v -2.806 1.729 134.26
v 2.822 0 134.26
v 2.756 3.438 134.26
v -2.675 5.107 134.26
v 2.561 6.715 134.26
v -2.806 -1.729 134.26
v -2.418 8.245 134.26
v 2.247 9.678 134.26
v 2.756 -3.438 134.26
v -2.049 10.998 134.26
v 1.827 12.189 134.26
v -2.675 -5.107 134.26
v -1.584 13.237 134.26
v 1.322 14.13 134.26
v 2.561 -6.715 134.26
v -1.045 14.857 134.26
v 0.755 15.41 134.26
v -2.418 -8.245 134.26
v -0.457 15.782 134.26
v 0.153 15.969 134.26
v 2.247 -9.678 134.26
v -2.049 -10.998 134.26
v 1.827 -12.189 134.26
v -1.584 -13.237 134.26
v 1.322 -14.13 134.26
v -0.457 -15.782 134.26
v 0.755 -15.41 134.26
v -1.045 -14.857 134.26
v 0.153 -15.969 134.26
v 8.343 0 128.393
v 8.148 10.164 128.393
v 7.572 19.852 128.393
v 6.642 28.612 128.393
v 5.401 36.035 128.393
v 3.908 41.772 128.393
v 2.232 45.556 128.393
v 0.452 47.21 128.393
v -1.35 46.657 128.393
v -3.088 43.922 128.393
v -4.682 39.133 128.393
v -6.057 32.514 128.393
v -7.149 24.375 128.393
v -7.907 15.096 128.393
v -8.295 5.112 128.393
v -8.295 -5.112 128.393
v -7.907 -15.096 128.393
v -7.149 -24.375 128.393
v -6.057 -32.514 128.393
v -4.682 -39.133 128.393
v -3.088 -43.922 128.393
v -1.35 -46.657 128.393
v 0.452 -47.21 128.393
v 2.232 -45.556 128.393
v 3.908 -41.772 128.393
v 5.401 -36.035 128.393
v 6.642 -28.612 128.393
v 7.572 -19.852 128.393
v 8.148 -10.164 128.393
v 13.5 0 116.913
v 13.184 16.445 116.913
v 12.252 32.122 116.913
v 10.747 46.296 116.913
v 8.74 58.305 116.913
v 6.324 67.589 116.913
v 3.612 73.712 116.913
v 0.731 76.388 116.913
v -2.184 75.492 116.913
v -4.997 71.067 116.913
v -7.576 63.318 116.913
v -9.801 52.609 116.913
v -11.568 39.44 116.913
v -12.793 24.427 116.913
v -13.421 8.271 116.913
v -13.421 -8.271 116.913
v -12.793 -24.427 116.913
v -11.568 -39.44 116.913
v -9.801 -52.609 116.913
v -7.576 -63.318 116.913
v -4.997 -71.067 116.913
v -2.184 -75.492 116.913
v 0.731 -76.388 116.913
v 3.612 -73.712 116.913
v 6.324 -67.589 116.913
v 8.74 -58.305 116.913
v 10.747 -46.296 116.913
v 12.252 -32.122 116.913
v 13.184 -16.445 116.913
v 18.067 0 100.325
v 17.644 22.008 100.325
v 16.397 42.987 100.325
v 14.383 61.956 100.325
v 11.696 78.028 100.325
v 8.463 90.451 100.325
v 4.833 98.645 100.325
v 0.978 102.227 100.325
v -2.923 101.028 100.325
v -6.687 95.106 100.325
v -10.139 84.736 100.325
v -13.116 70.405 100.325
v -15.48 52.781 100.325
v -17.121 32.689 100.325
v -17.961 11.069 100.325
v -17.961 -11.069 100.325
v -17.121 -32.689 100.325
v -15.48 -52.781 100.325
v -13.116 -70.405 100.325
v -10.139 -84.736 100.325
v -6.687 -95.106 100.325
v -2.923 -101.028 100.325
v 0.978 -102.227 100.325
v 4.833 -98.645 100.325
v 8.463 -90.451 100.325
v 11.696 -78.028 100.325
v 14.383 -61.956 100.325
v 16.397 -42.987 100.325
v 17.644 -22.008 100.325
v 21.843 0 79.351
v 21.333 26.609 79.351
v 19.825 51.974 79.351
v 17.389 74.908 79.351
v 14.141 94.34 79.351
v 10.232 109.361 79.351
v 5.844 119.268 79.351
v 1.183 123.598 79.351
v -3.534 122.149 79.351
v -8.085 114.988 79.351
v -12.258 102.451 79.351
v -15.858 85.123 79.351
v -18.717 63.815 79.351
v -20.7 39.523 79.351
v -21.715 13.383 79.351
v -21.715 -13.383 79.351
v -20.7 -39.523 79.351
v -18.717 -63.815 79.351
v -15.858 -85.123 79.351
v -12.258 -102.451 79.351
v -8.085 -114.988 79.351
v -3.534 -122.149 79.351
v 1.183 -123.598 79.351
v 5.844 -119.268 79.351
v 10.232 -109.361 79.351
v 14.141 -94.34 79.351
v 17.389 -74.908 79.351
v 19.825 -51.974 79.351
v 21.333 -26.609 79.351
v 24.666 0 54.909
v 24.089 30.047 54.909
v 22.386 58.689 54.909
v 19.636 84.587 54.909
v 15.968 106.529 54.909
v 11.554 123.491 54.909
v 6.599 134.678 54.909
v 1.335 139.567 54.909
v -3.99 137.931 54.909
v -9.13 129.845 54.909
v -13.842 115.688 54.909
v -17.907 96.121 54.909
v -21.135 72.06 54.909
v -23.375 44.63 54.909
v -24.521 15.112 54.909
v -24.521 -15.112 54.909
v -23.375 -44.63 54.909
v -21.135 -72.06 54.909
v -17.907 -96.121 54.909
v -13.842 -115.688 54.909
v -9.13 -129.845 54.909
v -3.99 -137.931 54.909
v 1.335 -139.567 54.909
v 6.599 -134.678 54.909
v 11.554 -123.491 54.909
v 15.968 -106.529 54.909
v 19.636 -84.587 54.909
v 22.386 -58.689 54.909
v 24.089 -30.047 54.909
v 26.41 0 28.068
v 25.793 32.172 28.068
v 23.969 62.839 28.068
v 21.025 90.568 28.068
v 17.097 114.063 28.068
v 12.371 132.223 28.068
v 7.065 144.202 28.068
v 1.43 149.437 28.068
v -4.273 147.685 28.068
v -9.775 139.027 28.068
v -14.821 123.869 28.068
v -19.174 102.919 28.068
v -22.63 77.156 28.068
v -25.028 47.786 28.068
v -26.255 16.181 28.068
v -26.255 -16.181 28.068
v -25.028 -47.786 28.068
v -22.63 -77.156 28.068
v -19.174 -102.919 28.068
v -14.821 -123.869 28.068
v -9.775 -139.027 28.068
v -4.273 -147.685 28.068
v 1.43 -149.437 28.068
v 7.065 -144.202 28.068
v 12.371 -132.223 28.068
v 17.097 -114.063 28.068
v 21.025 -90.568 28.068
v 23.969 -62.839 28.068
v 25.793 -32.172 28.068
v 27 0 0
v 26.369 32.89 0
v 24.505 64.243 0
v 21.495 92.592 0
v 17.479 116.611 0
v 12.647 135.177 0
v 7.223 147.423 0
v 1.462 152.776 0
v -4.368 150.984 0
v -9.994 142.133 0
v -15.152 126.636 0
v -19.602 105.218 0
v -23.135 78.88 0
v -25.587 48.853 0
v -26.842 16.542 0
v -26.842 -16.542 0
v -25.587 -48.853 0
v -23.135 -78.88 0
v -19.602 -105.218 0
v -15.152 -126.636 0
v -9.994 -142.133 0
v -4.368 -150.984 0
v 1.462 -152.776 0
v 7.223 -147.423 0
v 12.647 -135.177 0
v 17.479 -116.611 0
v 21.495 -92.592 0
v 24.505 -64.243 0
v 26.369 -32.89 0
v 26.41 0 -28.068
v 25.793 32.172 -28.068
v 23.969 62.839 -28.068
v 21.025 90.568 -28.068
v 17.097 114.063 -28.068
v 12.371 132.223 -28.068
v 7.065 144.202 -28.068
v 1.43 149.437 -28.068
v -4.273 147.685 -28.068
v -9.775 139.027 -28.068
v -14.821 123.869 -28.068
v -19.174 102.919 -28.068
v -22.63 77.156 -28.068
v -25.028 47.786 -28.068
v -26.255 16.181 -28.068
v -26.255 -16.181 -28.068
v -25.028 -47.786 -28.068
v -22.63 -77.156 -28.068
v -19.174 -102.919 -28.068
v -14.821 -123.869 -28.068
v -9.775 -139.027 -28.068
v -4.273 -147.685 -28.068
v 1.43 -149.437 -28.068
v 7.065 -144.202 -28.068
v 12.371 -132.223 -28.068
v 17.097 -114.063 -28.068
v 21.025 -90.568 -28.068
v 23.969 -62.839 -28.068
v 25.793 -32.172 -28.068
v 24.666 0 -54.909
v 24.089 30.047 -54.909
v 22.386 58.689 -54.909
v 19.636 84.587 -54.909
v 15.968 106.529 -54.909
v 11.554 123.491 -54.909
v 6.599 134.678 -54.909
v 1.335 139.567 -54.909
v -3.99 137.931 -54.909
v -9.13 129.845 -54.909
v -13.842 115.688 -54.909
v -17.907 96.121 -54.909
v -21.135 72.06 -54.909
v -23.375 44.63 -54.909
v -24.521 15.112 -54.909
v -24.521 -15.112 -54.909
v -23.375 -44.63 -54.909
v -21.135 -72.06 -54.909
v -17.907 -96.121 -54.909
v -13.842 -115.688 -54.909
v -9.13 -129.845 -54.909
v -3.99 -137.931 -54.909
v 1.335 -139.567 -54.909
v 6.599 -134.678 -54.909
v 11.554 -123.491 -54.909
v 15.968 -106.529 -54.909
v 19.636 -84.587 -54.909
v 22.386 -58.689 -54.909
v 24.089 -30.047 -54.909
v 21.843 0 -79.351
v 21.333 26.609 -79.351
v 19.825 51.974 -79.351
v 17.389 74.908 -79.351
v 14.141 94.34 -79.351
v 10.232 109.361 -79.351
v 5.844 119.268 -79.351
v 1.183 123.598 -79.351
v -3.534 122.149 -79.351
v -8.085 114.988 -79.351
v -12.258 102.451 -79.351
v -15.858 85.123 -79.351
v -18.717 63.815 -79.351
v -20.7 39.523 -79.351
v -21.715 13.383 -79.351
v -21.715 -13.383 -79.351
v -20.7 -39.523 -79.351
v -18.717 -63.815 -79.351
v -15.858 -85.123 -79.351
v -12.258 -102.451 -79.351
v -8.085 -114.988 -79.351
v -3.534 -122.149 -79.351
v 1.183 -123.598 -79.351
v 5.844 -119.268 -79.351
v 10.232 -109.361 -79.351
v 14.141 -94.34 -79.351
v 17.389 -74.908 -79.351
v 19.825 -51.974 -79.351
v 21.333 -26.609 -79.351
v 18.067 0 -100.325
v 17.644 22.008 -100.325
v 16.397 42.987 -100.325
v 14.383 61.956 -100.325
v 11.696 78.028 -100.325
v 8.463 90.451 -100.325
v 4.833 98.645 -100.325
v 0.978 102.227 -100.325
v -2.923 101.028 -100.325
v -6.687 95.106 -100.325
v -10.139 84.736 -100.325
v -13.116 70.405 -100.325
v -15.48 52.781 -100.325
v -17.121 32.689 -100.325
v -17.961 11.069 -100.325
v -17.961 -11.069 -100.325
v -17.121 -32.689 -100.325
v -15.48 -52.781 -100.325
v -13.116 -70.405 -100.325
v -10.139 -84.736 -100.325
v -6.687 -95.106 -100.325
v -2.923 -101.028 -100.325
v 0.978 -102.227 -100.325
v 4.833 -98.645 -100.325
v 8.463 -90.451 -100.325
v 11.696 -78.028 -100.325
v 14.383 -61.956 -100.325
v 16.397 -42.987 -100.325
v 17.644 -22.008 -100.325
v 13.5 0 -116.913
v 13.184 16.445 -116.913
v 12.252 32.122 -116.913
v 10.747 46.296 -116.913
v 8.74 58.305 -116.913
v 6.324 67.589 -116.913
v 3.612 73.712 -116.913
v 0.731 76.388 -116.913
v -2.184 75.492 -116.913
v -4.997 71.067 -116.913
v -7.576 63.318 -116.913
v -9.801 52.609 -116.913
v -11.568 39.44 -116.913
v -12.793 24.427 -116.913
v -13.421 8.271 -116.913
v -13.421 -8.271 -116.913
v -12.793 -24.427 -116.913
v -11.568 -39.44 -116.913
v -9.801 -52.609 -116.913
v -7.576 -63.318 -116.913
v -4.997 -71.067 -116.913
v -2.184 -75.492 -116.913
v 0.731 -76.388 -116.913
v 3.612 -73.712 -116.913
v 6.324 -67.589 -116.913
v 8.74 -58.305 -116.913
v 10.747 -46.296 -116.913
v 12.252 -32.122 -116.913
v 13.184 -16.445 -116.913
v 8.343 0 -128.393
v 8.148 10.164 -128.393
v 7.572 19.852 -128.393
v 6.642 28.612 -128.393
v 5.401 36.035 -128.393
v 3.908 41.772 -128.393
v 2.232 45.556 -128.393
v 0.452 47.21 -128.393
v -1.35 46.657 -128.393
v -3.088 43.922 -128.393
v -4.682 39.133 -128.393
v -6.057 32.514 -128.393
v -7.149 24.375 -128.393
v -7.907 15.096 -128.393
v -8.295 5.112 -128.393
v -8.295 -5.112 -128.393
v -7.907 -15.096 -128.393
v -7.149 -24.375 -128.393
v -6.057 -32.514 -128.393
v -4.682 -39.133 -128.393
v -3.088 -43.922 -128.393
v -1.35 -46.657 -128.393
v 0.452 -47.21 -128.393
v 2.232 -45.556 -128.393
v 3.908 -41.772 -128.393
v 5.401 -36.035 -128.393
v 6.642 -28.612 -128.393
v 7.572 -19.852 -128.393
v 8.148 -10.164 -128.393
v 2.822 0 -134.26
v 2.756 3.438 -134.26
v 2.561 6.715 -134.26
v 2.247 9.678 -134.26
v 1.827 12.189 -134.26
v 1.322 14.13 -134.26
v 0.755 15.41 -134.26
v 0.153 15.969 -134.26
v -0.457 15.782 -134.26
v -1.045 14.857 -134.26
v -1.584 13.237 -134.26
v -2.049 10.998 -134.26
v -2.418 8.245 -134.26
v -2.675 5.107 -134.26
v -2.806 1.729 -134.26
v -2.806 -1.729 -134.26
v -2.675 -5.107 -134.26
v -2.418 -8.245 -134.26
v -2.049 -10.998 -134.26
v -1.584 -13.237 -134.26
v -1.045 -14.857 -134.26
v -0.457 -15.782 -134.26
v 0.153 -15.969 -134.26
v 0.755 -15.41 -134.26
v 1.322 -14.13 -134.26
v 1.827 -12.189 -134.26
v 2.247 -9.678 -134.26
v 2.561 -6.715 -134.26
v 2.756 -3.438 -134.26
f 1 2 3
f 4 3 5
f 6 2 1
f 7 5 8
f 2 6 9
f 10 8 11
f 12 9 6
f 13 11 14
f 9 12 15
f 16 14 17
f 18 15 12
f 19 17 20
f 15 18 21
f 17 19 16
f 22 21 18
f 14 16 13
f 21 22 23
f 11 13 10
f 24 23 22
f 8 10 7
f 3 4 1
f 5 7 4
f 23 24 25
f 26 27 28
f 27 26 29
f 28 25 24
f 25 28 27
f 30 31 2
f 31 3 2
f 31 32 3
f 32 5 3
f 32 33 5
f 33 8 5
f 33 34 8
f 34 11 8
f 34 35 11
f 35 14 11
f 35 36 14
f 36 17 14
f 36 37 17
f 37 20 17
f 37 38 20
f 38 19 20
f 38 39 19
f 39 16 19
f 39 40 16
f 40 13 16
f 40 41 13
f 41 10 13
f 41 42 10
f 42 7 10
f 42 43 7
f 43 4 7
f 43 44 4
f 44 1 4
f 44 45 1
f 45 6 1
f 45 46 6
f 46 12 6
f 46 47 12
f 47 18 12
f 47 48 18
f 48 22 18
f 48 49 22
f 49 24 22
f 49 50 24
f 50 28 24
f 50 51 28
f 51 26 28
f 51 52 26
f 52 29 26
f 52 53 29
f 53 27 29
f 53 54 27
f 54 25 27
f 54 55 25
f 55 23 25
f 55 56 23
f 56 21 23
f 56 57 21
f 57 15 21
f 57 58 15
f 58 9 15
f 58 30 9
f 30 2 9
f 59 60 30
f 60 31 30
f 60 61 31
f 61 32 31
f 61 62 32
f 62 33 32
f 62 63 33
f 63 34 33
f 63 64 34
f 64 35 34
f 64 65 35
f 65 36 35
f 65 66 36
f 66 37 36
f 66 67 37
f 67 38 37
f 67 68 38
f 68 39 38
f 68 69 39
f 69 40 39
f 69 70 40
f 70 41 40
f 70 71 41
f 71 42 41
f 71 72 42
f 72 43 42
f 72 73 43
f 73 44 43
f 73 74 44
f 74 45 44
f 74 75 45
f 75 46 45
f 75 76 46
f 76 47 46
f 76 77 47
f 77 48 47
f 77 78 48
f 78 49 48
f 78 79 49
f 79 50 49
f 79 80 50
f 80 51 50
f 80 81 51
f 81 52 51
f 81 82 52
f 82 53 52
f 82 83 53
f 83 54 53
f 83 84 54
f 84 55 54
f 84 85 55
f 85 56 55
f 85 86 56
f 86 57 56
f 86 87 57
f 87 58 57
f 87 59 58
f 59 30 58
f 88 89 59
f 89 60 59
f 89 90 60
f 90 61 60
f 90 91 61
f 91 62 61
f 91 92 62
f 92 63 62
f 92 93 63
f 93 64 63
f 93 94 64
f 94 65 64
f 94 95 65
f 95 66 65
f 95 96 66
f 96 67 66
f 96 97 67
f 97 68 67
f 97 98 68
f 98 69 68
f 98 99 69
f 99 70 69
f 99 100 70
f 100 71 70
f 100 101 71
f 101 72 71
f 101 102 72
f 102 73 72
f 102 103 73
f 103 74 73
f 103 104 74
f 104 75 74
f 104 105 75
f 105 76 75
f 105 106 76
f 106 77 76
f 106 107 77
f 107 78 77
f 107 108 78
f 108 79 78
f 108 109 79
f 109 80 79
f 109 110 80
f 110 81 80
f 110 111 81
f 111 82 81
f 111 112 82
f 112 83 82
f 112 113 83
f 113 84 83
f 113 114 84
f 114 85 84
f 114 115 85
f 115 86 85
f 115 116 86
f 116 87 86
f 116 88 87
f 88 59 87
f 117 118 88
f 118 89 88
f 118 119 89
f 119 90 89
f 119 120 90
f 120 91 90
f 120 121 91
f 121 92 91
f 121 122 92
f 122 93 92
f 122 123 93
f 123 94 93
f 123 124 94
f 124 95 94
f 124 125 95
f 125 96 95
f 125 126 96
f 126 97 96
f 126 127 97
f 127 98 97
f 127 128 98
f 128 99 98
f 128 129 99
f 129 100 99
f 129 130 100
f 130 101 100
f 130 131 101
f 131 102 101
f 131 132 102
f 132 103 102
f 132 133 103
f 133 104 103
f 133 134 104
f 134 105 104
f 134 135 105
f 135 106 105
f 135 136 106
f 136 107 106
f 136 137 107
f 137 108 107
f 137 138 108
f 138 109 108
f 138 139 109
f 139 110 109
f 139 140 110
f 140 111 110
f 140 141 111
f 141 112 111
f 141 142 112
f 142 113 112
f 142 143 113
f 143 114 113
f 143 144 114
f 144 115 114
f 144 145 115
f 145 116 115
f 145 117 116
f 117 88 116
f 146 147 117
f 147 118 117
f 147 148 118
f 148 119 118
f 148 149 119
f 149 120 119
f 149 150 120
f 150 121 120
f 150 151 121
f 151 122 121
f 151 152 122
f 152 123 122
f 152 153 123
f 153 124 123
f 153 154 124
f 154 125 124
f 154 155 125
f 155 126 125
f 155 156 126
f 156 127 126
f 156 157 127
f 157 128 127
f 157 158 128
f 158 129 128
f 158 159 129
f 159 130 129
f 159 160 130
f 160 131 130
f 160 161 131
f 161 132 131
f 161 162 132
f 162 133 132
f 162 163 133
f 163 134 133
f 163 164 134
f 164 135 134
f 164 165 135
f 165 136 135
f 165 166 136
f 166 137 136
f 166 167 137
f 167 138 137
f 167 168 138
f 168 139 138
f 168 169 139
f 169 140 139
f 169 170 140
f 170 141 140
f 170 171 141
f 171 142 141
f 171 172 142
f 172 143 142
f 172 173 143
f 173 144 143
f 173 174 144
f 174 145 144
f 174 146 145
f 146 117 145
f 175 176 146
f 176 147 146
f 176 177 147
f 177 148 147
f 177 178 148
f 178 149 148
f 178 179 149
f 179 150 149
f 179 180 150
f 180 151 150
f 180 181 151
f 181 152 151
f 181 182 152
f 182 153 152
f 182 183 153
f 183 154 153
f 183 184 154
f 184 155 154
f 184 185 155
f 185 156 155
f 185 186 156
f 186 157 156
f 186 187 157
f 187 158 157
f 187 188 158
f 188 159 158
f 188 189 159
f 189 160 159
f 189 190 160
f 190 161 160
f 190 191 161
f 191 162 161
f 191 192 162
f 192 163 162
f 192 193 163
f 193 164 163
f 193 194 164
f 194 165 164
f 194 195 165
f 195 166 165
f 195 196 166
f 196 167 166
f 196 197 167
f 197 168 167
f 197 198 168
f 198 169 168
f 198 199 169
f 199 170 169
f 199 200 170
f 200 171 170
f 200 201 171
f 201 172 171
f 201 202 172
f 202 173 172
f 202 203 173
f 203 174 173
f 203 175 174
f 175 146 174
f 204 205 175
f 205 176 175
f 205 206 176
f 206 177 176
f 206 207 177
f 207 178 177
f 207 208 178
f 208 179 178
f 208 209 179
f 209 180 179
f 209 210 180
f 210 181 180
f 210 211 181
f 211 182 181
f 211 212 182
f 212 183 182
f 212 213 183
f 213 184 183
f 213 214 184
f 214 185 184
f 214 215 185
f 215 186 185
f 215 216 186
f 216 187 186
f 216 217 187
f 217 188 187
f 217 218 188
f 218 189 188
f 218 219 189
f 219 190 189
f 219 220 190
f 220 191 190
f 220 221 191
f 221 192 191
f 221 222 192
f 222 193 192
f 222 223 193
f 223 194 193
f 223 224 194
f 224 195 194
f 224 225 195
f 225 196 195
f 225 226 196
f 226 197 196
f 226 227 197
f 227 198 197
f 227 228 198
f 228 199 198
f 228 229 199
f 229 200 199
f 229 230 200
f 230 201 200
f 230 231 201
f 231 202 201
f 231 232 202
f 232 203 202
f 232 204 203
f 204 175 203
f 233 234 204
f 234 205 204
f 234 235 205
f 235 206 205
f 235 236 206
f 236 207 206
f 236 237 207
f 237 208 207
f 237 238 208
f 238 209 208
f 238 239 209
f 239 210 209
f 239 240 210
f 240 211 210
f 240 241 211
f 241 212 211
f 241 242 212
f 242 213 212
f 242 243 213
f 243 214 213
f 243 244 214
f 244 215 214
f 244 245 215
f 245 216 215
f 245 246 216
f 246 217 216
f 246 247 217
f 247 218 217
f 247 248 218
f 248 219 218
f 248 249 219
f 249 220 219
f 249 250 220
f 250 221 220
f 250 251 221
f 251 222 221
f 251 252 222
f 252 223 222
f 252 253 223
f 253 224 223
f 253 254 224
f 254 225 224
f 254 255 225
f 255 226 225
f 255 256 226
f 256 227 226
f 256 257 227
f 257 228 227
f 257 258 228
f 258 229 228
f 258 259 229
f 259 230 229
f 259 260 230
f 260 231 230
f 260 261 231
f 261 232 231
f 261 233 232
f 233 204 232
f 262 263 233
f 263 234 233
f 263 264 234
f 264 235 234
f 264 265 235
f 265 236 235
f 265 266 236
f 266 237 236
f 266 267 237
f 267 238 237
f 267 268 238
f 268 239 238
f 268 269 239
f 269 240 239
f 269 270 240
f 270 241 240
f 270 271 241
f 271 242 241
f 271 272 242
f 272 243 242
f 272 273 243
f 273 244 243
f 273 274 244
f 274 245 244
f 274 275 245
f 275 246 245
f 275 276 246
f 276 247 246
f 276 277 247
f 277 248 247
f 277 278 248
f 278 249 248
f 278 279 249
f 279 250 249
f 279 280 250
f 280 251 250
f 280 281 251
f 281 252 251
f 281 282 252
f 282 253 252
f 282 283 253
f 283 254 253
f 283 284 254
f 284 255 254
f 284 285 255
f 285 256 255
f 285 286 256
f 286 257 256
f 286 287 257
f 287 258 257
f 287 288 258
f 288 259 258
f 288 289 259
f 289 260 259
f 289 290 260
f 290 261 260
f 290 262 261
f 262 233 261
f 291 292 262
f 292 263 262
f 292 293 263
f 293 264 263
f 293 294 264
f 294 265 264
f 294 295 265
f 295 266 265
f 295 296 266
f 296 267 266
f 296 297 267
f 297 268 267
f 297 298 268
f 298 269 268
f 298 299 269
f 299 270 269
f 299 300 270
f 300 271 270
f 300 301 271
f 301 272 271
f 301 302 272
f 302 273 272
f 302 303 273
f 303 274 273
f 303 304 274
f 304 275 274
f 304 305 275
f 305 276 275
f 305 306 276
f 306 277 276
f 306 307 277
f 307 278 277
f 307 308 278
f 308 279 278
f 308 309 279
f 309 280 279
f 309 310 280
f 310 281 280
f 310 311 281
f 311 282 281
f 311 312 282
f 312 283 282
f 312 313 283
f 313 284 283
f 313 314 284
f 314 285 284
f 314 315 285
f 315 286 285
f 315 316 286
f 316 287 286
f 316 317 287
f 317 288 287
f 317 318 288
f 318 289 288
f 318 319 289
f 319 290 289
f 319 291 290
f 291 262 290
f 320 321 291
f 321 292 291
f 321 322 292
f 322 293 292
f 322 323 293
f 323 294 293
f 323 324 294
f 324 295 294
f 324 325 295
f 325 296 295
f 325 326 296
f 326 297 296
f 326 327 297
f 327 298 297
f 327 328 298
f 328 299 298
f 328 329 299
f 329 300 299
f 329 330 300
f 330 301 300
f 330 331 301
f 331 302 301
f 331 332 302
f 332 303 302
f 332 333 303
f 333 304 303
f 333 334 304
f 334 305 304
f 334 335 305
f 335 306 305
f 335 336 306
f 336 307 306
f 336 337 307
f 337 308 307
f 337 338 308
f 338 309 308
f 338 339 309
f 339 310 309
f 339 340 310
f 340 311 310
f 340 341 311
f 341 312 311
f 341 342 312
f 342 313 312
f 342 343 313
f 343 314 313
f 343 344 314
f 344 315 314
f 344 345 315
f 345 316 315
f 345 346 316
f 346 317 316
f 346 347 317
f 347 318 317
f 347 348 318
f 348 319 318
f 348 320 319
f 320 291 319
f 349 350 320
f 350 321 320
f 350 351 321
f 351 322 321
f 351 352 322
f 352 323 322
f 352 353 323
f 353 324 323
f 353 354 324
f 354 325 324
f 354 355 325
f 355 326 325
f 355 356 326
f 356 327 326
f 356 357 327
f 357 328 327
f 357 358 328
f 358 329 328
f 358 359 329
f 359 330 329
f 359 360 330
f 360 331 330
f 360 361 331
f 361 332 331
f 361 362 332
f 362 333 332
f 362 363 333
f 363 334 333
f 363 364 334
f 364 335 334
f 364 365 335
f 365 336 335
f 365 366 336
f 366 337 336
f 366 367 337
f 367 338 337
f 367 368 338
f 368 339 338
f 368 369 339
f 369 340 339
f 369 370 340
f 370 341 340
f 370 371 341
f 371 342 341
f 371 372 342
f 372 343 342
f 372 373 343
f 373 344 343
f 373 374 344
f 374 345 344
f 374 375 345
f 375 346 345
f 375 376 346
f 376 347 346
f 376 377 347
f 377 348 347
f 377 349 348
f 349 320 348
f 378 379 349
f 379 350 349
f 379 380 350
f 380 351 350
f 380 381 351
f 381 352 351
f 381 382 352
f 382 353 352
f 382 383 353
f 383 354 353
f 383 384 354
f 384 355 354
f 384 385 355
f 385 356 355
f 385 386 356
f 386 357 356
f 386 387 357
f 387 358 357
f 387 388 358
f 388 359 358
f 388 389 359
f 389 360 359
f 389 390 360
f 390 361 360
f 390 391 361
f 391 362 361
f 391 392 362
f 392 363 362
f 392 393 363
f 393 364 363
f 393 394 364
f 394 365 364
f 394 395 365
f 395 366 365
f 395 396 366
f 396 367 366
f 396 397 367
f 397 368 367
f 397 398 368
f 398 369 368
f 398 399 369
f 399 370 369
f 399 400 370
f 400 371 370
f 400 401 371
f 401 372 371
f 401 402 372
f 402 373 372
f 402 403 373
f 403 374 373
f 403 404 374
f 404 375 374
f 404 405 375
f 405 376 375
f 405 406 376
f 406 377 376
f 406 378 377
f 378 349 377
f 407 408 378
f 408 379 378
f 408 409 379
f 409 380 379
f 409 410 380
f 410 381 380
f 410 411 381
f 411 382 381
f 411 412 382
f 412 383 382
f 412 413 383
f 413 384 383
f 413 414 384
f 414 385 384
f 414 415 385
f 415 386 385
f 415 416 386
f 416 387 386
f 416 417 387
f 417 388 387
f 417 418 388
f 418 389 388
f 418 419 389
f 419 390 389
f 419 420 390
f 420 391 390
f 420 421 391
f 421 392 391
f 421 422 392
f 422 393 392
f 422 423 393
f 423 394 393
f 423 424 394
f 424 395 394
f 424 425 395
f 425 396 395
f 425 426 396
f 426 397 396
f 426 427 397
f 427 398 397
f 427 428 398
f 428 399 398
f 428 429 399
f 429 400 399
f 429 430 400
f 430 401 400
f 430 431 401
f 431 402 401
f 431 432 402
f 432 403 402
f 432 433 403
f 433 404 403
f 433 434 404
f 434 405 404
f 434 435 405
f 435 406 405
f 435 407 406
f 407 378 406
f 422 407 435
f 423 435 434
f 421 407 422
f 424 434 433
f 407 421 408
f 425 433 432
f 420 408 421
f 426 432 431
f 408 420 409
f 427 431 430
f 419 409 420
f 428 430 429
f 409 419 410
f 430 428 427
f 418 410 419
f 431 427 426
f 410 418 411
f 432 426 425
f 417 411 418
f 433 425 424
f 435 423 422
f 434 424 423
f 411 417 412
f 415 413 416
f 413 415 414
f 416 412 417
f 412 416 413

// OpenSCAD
// Generated by SolidPython 1.0.1 on 2020-07-29 00:46:46


scale(v = [3, 17, 15]) {
	sphere(r = 9);
}
/***********************************************
*********      SolidPython code:      **********
************************************************
 
# import packages: SolidPython
from solid import *
from solid.utils import *
from itertools import chain, combinations, permutations


class Resize:

    def __init__(self, scad_file):
        self.scad_file = scad_file
        #self.scad_file = import_scad(scad_file)
        # cone/cylinder param:
        self.r1 = 0
        self.r2 = 0
        self.h = 0
        # rectangular prism param:
        self.w = 0
        self.l = 0
        # ellipse param:
        self.r = 0

    # import OpenScad code (file name corresponds to shape)


    # classify shape + parameters
    def assign(self, param1, param2, param3):
        if self.scad_file == 'cone.scad':
            self.r1 = param1
            self.r2 = param2
            self.h = param3
        elif self.scad_file == 'cylinder.scad':
            self.r1 = param1
            self.r2 = param2
            self.h = param3
        elif self.scad_file == 'rectangularPrism.scad':
            self.h = param1
            self.l = param2
            self.w = param3
        else:
            self.r = param1
            self.h = param2

    # resize parameters
    def iterate(self):
        x = range(3, 20, 2)
        i = 1
        if self.scad_file == 'cone.scad':
            tempList = list(permutations(x, 2))
            for temp in tempList:
                param1 = temp[0]
                param2 = temp[1]
                filepath = 'produced_scad_files/' + 'cone' + str(param1) + '_' + str(param2) + '_' + '.scad'
                scad_render_to_file(cylinder(h=param1, r1=param2, r2=0), filepath)

        elif self.scad_file == 'cylinder.scad':
            tempList = list(permutations(x, 3))
            for temp in tempList:
                param1 = temp[0]
                param2 = temp[1]
                filepath = 'produced_scad_files/' + 'cylinder' + str(param1) + '_' + str(param2) + '_' + '.scad'
                scad_render_to_file(cylinder(h=param1, r1=param2, r2=param2), filepath)

        elif self.scad_file == 'rectangularPrism.scad':
            tempList = list(permutations(x, 3))
            for temp in tempList:
                param1 = temp[0]
                param2 = temp[1]
                param3 = temp[2]
                filepath = 'produced_scad_files/' + 'rectangularPrism' + str(param1) + '_' + str(param2) + '_' + str(
                    param3) + '.scad'
                scad_render_to_file(cube(size=(param1, param2, param3)), filepath)

        elif self.scad_file == 'ellipse.scad':
            tempList = list(permutations(x, 4))
            for temp in tempList:
                param1 = temp[0]
                param2 = temp[1]
                param3 = temp[2]
                param4 = temp[3]
                filepath = 'produced_scad_files/' + 'ellipse' + str(param1) + '_' + str(param2) + '_' + str(param3) + '_' + str(param4) + '.scad'
                scad_render_to_file(scale([param1, param2, param3])(sphere(r=param4)), filepath)

    def render_to_scadfile(self):
        scad_render_to_file(scad, 'example.scad') 
 
************************************************/
